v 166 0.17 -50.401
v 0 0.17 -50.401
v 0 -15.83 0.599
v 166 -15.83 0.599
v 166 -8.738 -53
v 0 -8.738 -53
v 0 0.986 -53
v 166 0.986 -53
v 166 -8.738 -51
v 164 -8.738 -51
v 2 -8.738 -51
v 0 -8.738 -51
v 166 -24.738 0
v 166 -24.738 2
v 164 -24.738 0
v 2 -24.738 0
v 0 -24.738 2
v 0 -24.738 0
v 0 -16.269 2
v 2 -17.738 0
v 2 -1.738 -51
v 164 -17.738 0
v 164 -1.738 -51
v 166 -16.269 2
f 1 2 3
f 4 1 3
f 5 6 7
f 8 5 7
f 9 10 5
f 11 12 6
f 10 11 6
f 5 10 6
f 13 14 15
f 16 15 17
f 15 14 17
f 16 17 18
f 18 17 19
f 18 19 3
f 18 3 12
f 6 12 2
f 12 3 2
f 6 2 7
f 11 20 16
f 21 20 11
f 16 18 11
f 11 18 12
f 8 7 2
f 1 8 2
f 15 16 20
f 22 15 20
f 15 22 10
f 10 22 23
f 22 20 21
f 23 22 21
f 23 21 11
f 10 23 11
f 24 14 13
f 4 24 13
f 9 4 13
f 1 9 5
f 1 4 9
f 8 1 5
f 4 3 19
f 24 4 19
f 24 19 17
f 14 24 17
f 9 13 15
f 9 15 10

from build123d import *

# Parameters (mm, degrees)
BOSS_EXTRUDE2_DEPTH = 166
BOSS_EXTRUDE3_DEPTH = 2
BOSS_EXTRUDE4_DEPTH = 2


with BuildPart() as part:
    # Sketch2 → Boss-Extrude2 (new body)
    with BuildSketch(Plane(origin=(0, 0, 0), x_dir=(0, 0, -1), z_dir=(1, 0, 0))):
        Polygon((51, -1.737908105), (51, -8.737908105), (53, -8.737908105), (53, -1.737908105), (53, 0.985657074), (50.401319851, 0.17038487), (-0.598680149, -15.82961513), (-2, -16.269244887), (-2, -17.737908105), (-2, -24.737908105), (0, -24.737908105), (0, -22.737908105), (0, -17.737908105), align=None)
    extrude(amount=BOSS_EXTRUDE2_DEPTH)

    # Sketch3 → Boss-Extrude3 (add)
    with BuildSketch(Plane.ZY):
        Polygon((-51, -1.737908105), (0, -17.737908105), (0, -24.737908105), (-51, -8.737908105), align=None)
    extrude(amount=-BOSS_EXTRUDE3_DEPTH)

    # Sketch4 → Boss-Extrude4 (add)
    with BuildSketch(Plane(origin=(166, 0, 0), x_dir=(0, 0, -1), z_dir=(1, 0, 0))):
        Polygon((51, -1.737908105), (0, -17.737908105), (0, -24.737908105), (51, -8.737908105), align=None)
    extrude(amount=-BOSS_EXTRUDE4_DEPTH)


solid = part.part
